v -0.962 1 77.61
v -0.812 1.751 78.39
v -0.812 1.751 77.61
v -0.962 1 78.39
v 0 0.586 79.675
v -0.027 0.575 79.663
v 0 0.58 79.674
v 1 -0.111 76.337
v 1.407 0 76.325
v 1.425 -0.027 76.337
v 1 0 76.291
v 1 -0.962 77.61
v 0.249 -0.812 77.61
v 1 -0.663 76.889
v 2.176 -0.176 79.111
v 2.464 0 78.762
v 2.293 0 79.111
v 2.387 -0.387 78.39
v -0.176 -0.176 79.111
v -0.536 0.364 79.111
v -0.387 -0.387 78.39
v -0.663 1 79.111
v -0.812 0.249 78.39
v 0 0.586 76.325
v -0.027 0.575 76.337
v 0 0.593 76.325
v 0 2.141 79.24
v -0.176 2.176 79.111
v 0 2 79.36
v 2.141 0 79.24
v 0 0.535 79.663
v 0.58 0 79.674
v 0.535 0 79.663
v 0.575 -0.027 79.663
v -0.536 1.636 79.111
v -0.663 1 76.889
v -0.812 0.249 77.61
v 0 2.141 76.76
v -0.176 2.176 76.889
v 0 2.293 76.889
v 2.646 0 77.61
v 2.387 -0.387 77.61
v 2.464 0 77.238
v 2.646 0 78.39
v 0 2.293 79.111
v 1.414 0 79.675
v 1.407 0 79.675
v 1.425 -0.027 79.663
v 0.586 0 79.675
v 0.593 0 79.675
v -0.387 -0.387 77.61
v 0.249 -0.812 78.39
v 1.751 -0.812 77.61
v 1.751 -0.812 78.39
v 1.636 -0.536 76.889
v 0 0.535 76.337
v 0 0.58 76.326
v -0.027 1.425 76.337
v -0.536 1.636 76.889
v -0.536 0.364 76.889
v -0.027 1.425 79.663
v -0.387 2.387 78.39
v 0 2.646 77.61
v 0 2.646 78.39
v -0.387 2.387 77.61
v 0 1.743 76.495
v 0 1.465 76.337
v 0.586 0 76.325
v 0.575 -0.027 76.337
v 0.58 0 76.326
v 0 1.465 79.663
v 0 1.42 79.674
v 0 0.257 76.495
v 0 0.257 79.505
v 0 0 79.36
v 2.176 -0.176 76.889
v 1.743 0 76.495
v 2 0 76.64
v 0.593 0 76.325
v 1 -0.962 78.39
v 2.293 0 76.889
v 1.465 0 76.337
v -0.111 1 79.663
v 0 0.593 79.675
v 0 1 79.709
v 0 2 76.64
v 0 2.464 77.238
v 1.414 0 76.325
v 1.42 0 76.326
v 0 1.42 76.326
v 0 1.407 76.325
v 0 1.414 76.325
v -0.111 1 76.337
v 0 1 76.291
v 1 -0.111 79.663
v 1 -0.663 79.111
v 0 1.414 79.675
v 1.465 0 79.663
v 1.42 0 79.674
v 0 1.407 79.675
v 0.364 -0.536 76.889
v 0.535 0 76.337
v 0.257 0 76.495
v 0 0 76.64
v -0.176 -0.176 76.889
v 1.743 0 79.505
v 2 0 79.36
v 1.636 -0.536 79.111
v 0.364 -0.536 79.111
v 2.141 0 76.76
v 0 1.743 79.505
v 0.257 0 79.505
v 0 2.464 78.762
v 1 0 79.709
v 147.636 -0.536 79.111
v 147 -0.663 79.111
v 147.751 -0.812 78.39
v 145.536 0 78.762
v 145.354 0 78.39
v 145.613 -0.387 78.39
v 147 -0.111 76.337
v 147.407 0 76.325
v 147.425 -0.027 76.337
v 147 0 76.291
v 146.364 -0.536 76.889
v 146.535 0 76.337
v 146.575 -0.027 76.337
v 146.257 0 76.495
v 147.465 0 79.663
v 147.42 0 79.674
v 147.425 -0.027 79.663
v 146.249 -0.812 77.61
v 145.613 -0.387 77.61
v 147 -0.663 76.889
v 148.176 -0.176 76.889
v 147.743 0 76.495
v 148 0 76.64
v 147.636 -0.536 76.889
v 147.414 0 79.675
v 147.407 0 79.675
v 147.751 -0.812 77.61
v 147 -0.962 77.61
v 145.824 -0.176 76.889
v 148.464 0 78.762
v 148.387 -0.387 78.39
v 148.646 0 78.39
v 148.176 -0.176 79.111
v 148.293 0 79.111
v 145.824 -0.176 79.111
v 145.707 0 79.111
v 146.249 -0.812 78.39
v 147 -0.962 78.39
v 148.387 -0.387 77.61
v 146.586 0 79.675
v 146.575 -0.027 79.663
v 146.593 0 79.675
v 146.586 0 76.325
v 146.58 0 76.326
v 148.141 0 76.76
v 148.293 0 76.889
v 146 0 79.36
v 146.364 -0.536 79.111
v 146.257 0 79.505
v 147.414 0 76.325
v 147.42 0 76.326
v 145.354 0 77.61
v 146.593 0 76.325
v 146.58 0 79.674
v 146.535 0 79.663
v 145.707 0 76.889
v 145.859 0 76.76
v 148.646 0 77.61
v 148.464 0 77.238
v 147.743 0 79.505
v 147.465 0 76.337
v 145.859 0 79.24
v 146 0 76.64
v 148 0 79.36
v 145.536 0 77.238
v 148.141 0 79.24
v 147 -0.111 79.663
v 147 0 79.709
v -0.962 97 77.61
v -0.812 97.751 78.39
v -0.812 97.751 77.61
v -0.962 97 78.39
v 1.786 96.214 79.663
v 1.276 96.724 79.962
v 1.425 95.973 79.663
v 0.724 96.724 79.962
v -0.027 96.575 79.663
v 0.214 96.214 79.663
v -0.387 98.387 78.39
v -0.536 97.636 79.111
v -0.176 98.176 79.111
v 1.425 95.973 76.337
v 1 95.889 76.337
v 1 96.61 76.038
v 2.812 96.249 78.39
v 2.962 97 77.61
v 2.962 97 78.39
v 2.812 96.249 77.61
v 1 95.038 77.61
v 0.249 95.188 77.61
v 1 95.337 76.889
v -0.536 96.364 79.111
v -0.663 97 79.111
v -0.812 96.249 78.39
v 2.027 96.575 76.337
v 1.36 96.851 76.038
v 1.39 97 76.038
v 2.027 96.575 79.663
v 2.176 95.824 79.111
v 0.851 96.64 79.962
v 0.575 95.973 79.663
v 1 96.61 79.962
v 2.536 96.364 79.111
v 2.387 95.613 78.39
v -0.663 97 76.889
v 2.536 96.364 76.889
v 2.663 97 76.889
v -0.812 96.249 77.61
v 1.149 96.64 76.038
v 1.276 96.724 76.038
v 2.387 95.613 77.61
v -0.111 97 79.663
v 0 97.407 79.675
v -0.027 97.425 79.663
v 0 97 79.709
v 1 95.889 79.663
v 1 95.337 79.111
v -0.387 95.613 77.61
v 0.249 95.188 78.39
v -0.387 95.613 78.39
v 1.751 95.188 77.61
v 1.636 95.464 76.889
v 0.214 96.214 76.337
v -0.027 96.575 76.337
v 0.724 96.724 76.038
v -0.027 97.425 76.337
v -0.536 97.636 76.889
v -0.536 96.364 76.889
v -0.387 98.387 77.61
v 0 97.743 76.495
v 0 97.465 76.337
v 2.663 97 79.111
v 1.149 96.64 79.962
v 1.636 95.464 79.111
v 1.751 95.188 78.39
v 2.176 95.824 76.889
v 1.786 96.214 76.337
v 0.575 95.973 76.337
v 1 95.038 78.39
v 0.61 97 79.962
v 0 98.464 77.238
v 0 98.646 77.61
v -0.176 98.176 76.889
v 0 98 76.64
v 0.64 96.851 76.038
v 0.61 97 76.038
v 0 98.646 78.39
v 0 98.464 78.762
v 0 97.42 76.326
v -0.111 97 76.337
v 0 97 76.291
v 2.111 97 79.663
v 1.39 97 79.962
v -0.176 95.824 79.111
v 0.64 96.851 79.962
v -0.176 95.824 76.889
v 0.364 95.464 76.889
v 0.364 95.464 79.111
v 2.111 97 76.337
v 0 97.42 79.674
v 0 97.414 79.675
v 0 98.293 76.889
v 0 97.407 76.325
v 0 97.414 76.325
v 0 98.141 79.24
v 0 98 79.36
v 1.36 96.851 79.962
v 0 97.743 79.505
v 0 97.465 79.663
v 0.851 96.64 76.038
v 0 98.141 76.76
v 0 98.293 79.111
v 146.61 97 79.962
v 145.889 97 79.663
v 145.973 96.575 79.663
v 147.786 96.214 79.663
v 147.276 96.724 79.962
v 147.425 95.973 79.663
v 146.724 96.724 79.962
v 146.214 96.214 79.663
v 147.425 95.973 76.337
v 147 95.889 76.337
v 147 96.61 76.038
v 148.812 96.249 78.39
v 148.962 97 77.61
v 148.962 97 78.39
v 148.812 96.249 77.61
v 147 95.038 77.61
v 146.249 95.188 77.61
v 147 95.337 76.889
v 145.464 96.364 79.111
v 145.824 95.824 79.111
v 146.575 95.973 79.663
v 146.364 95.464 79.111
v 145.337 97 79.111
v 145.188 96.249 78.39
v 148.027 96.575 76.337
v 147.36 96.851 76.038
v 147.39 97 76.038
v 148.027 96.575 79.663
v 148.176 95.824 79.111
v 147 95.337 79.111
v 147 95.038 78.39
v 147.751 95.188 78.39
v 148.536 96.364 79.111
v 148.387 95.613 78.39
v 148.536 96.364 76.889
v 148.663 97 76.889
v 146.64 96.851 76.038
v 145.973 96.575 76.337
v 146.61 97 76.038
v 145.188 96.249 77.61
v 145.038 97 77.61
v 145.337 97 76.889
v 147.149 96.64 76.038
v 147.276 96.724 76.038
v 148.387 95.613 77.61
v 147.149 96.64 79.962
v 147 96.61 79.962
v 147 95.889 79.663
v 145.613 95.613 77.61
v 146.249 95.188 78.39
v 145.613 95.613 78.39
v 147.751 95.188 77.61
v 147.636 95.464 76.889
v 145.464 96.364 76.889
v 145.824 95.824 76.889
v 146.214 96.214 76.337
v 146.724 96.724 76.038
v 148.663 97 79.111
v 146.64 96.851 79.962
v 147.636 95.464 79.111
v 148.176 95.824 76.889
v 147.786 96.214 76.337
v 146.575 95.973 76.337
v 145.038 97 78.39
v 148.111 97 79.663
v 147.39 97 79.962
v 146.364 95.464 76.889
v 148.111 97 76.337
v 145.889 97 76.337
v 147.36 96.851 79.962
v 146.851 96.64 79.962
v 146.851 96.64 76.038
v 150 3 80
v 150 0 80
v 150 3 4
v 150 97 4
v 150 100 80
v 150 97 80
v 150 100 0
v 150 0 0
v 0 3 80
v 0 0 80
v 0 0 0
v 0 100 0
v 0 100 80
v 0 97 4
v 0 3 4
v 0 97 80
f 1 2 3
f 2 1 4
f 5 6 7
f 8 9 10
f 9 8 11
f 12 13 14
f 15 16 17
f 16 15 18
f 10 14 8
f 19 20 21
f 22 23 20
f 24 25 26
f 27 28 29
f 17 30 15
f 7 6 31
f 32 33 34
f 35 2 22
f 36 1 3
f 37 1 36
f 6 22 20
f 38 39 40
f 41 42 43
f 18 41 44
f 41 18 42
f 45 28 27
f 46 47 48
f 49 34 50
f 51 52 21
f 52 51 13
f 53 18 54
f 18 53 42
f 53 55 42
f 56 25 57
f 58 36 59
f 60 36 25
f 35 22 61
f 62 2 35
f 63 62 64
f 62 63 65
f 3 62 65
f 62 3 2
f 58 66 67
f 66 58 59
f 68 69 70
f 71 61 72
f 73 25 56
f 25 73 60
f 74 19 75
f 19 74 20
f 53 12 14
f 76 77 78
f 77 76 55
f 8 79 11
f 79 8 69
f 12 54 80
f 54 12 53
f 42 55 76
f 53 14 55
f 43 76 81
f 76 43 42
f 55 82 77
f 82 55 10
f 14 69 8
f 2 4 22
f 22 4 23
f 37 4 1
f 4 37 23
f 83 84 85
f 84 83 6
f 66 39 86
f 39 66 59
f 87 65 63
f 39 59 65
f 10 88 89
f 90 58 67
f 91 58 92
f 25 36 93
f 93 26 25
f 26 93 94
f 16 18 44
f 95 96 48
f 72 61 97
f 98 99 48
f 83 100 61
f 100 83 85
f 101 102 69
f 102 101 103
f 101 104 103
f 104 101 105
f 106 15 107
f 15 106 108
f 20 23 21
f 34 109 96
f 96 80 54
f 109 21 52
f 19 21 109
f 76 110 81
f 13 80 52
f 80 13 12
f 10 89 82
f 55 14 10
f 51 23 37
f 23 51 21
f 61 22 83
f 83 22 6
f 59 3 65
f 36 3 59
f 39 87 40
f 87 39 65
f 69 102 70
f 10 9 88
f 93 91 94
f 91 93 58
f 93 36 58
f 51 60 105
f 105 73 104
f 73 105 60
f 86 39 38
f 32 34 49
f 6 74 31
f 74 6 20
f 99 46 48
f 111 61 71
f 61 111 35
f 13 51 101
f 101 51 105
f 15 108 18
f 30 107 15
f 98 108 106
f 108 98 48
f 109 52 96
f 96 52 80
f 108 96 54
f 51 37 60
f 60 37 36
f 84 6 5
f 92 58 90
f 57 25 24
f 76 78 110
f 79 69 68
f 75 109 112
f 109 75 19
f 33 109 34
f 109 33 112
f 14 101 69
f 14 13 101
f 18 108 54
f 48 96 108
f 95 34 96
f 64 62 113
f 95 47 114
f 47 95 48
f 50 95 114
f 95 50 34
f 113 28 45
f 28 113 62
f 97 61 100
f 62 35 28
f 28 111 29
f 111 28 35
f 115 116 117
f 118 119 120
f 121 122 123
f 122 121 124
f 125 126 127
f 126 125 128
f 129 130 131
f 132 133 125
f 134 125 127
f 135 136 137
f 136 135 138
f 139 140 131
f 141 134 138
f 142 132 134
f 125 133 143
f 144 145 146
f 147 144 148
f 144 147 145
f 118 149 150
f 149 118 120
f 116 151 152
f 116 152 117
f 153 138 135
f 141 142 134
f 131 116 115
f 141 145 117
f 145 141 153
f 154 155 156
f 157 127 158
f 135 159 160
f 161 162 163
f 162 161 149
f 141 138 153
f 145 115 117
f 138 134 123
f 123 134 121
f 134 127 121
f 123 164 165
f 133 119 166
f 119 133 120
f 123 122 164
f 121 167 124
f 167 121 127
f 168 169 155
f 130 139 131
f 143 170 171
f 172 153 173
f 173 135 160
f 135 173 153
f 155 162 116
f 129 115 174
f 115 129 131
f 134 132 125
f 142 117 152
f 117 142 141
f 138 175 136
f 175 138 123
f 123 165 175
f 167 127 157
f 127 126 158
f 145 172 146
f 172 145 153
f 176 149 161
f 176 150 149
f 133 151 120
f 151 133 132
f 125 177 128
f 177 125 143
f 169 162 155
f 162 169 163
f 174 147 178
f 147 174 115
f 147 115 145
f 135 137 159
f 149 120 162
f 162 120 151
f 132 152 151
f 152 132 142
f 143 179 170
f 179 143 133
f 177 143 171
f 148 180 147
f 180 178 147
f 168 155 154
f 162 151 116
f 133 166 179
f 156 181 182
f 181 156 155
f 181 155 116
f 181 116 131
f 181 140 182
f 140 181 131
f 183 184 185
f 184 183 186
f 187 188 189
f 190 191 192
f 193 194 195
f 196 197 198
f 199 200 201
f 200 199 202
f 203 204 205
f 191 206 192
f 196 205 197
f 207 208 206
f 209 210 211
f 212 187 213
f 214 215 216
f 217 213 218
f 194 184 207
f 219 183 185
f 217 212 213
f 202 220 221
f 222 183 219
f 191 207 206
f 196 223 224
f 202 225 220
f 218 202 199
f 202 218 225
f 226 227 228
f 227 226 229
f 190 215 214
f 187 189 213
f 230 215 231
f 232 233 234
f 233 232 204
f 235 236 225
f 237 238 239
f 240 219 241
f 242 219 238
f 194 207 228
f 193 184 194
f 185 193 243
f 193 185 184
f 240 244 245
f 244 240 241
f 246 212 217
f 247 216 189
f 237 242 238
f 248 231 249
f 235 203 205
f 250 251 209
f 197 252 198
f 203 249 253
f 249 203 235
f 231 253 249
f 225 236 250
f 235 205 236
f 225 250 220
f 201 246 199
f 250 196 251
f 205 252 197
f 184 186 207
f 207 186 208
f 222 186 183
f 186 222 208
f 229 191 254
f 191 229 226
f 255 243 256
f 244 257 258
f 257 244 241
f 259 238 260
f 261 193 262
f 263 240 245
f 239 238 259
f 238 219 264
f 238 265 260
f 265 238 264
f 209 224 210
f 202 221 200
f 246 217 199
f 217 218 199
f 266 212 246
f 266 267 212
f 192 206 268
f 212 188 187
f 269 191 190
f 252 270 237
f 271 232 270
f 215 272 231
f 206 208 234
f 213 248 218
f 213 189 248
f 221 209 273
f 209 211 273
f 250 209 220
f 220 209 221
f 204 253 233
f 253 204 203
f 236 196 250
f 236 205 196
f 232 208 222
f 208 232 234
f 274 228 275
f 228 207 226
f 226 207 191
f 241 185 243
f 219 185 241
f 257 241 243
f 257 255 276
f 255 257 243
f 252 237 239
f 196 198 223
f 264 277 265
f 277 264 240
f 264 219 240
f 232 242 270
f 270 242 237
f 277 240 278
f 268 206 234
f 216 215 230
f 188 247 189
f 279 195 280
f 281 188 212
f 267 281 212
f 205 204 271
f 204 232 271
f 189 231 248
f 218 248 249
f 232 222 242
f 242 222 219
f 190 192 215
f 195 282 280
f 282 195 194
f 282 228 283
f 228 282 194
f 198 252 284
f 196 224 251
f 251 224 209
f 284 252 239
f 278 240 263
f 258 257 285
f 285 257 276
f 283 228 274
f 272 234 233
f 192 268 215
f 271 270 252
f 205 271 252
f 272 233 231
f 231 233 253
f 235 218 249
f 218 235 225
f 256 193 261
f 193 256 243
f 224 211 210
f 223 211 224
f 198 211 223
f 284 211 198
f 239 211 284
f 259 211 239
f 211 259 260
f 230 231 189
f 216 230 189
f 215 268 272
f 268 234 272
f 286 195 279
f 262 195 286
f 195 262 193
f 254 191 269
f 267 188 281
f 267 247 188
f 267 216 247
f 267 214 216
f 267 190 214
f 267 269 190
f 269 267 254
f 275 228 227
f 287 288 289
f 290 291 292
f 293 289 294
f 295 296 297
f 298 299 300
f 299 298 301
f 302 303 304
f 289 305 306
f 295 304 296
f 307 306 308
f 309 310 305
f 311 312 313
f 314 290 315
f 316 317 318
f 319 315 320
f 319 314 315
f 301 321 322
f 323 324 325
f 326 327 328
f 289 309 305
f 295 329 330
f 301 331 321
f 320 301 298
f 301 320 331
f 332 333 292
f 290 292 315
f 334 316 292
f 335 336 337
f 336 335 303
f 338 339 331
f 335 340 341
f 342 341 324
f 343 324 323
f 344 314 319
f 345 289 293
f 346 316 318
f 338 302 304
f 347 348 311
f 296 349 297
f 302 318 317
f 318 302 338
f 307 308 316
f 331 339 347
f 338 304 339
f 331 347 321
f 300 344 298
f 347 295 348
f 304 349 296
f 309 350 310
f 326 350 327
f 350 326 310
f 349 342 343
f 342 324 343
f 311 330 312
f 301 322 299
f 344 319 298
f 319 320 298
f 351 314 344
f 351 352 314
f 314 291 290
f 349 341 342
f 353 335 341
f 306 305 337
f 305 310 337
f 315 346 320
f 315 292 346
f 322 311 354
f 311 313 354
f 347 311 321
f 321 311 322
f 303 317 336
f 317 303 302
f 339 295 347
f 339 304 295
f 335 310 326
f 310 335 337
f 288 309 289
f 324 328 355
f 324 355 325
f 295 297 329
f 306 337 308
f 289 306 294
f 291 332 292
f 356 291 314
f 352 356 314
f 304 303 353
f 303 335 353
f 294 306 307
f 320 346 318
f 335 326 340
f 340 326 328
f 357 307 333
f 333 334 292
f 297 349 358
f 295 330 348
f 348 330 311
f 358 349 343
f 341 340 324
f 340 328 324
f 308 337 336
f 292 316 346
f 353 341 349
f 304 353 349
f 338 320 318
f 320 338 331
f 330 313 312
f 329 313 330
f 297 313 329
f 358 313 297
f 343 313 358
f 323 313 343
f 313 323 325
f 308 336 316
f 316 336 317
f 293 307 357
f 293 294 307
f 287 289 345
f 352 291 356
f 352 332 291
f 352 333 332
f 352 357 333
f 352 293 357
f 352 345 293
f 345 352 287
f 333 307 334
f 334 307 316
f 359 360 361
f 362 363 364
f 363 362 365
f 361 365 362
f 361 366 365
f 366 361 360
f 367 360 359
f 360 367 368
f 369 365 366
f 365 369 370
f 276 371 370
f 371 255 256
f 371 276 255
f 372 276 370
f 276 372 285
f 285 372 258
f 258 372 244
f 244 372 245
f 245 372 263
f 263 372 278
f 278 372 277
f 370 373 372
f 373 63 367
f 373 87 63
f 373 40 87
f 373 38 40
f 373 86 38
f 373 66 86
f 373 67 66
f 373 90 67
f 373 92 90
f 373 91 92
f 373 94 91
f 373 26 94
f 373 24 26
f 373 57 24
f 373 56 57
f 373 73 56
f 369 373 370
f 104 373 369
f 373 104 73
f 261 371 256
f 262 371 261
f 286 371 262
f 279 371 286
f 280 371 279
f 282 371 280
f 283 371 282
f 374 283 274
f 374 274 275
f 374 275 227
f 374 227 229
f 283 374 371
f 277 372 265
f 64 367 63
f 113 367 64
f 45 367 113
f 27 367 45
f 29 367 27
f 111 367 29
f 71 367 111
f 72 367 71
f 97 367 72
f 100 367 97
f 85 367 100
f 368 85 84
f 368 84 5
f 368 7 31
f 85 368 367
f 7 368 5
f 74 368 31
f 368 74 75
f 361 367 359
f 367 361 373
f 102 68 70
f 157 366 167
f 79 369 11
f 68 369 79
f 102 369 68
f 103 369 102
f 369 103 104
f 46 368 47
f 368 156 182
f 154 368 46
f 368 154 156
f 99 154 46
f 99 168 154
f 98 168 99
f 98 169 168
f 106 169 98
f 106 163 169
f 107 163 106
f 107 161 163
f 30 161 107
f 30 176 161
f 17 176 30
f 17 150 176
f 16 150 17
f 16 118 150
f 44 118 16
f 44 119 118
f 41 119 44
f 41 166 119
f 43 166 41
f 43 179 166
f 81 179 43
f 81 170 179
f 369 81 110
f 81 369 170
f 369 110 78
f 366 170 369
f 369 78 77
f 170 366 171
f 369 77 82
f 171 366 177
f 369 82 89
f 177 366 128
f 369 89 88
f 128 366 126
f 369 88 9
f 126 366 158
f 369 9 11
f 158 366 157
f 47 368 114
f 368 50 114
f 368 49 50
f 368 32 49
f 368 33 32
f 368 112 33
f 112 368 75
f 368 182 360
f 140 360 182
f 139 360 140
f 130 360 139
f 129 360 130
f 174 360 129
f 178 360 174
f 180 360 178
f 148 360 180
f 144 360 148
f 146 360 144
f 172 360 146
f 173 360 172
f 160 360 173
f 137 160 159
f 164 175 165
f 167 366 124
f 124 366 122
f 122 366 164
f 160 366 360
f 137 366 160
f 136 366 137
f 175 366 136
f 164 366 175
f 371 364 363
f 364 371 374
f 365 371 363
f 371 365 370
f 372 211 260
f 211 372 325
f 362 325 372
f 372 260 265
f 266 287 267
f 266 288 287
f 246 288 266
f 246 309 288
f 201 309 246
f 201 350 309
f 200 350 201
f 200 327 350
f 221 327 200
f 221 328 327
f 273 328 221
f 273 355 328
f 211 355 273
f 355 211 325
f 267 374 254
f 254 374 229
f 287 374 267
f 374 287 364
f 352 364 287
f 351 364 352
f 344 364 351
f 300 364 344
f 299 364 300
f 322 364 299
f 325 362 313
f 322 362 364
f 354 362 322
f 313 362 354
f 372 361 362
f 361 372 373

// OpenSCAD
// Låda med botten - Parametrar
box_width = 150;        // [50:5:300]  Bredd
box_depth = 100;        // [30:5:200]  Djup
box_height = 80;        // [20:5:150]  Höjd
wall_thickness = 3;     // [1:0.5:6]   Vägg-tjocklek
bottom_thickness = 4;   // [1.5:0.5:8] Bottentjocklek
fillet_radius = 2;      // [0:0.5:6]   Filé-radie
box_color = "SaddleBrown";  //             Lådfärg

module box_with_bottom(w, d, h, wt, bt, fr, col) {
    // Inre mått
    iw = w - 2 * wt;       // inner width
    id = d - 2 * wt;       // inner depth
    ih = h - bt;            // inner height

    union() {
        // Bottenplatta
        color("Silver")
        cube([w, d, bt], center = false);

        // Vägg- och hörn-kropp
        color(col)
        union() {
            // Framvägg
            cube([w, wt, h], center = false);

            // Bakvägg
            translate([0, d - wt, 0])
            cube([w, wt, h], center = false);

            // Vänster vägg (mellan fram/bak)
            translate([wt, 0, bt])
            cube(wt, id, ih);

            // Höger vägg (mellan fram/bak)
            translate([w - wt, 0, bt])
            cube(wt, id, ih);

            // Filéerade hörn (om filé är aktiverad)
            if (fr > 0) {
                // Fram-vänster hörn
                translate([wt - fr, wt - fr, h - fr])
                sphere(r = fr, $fn = 16);

                // Fram-höger hörn
                translate([w - wt + fr - fr, wt - fr, h - fr])
                sphere(r = fr, $fn = 16);

                // Bak-vänster hörn
                translate([wt - fr, d - wt + fr - fr, h - fr])
                sphere(r = fr, $fn = 16);

                // Bak-höger hörn
                translate([w - wt + fr - fr, d - wt + fr - fr, h - fr])
                sphere(r = fr, $fn = 16);
            }
        }
    }
}

// Skapa lådan
box_with_bottom(box_width, box_depth, box_height, wall_thickness, bottom_thickness, fillet_radius, box_color);
